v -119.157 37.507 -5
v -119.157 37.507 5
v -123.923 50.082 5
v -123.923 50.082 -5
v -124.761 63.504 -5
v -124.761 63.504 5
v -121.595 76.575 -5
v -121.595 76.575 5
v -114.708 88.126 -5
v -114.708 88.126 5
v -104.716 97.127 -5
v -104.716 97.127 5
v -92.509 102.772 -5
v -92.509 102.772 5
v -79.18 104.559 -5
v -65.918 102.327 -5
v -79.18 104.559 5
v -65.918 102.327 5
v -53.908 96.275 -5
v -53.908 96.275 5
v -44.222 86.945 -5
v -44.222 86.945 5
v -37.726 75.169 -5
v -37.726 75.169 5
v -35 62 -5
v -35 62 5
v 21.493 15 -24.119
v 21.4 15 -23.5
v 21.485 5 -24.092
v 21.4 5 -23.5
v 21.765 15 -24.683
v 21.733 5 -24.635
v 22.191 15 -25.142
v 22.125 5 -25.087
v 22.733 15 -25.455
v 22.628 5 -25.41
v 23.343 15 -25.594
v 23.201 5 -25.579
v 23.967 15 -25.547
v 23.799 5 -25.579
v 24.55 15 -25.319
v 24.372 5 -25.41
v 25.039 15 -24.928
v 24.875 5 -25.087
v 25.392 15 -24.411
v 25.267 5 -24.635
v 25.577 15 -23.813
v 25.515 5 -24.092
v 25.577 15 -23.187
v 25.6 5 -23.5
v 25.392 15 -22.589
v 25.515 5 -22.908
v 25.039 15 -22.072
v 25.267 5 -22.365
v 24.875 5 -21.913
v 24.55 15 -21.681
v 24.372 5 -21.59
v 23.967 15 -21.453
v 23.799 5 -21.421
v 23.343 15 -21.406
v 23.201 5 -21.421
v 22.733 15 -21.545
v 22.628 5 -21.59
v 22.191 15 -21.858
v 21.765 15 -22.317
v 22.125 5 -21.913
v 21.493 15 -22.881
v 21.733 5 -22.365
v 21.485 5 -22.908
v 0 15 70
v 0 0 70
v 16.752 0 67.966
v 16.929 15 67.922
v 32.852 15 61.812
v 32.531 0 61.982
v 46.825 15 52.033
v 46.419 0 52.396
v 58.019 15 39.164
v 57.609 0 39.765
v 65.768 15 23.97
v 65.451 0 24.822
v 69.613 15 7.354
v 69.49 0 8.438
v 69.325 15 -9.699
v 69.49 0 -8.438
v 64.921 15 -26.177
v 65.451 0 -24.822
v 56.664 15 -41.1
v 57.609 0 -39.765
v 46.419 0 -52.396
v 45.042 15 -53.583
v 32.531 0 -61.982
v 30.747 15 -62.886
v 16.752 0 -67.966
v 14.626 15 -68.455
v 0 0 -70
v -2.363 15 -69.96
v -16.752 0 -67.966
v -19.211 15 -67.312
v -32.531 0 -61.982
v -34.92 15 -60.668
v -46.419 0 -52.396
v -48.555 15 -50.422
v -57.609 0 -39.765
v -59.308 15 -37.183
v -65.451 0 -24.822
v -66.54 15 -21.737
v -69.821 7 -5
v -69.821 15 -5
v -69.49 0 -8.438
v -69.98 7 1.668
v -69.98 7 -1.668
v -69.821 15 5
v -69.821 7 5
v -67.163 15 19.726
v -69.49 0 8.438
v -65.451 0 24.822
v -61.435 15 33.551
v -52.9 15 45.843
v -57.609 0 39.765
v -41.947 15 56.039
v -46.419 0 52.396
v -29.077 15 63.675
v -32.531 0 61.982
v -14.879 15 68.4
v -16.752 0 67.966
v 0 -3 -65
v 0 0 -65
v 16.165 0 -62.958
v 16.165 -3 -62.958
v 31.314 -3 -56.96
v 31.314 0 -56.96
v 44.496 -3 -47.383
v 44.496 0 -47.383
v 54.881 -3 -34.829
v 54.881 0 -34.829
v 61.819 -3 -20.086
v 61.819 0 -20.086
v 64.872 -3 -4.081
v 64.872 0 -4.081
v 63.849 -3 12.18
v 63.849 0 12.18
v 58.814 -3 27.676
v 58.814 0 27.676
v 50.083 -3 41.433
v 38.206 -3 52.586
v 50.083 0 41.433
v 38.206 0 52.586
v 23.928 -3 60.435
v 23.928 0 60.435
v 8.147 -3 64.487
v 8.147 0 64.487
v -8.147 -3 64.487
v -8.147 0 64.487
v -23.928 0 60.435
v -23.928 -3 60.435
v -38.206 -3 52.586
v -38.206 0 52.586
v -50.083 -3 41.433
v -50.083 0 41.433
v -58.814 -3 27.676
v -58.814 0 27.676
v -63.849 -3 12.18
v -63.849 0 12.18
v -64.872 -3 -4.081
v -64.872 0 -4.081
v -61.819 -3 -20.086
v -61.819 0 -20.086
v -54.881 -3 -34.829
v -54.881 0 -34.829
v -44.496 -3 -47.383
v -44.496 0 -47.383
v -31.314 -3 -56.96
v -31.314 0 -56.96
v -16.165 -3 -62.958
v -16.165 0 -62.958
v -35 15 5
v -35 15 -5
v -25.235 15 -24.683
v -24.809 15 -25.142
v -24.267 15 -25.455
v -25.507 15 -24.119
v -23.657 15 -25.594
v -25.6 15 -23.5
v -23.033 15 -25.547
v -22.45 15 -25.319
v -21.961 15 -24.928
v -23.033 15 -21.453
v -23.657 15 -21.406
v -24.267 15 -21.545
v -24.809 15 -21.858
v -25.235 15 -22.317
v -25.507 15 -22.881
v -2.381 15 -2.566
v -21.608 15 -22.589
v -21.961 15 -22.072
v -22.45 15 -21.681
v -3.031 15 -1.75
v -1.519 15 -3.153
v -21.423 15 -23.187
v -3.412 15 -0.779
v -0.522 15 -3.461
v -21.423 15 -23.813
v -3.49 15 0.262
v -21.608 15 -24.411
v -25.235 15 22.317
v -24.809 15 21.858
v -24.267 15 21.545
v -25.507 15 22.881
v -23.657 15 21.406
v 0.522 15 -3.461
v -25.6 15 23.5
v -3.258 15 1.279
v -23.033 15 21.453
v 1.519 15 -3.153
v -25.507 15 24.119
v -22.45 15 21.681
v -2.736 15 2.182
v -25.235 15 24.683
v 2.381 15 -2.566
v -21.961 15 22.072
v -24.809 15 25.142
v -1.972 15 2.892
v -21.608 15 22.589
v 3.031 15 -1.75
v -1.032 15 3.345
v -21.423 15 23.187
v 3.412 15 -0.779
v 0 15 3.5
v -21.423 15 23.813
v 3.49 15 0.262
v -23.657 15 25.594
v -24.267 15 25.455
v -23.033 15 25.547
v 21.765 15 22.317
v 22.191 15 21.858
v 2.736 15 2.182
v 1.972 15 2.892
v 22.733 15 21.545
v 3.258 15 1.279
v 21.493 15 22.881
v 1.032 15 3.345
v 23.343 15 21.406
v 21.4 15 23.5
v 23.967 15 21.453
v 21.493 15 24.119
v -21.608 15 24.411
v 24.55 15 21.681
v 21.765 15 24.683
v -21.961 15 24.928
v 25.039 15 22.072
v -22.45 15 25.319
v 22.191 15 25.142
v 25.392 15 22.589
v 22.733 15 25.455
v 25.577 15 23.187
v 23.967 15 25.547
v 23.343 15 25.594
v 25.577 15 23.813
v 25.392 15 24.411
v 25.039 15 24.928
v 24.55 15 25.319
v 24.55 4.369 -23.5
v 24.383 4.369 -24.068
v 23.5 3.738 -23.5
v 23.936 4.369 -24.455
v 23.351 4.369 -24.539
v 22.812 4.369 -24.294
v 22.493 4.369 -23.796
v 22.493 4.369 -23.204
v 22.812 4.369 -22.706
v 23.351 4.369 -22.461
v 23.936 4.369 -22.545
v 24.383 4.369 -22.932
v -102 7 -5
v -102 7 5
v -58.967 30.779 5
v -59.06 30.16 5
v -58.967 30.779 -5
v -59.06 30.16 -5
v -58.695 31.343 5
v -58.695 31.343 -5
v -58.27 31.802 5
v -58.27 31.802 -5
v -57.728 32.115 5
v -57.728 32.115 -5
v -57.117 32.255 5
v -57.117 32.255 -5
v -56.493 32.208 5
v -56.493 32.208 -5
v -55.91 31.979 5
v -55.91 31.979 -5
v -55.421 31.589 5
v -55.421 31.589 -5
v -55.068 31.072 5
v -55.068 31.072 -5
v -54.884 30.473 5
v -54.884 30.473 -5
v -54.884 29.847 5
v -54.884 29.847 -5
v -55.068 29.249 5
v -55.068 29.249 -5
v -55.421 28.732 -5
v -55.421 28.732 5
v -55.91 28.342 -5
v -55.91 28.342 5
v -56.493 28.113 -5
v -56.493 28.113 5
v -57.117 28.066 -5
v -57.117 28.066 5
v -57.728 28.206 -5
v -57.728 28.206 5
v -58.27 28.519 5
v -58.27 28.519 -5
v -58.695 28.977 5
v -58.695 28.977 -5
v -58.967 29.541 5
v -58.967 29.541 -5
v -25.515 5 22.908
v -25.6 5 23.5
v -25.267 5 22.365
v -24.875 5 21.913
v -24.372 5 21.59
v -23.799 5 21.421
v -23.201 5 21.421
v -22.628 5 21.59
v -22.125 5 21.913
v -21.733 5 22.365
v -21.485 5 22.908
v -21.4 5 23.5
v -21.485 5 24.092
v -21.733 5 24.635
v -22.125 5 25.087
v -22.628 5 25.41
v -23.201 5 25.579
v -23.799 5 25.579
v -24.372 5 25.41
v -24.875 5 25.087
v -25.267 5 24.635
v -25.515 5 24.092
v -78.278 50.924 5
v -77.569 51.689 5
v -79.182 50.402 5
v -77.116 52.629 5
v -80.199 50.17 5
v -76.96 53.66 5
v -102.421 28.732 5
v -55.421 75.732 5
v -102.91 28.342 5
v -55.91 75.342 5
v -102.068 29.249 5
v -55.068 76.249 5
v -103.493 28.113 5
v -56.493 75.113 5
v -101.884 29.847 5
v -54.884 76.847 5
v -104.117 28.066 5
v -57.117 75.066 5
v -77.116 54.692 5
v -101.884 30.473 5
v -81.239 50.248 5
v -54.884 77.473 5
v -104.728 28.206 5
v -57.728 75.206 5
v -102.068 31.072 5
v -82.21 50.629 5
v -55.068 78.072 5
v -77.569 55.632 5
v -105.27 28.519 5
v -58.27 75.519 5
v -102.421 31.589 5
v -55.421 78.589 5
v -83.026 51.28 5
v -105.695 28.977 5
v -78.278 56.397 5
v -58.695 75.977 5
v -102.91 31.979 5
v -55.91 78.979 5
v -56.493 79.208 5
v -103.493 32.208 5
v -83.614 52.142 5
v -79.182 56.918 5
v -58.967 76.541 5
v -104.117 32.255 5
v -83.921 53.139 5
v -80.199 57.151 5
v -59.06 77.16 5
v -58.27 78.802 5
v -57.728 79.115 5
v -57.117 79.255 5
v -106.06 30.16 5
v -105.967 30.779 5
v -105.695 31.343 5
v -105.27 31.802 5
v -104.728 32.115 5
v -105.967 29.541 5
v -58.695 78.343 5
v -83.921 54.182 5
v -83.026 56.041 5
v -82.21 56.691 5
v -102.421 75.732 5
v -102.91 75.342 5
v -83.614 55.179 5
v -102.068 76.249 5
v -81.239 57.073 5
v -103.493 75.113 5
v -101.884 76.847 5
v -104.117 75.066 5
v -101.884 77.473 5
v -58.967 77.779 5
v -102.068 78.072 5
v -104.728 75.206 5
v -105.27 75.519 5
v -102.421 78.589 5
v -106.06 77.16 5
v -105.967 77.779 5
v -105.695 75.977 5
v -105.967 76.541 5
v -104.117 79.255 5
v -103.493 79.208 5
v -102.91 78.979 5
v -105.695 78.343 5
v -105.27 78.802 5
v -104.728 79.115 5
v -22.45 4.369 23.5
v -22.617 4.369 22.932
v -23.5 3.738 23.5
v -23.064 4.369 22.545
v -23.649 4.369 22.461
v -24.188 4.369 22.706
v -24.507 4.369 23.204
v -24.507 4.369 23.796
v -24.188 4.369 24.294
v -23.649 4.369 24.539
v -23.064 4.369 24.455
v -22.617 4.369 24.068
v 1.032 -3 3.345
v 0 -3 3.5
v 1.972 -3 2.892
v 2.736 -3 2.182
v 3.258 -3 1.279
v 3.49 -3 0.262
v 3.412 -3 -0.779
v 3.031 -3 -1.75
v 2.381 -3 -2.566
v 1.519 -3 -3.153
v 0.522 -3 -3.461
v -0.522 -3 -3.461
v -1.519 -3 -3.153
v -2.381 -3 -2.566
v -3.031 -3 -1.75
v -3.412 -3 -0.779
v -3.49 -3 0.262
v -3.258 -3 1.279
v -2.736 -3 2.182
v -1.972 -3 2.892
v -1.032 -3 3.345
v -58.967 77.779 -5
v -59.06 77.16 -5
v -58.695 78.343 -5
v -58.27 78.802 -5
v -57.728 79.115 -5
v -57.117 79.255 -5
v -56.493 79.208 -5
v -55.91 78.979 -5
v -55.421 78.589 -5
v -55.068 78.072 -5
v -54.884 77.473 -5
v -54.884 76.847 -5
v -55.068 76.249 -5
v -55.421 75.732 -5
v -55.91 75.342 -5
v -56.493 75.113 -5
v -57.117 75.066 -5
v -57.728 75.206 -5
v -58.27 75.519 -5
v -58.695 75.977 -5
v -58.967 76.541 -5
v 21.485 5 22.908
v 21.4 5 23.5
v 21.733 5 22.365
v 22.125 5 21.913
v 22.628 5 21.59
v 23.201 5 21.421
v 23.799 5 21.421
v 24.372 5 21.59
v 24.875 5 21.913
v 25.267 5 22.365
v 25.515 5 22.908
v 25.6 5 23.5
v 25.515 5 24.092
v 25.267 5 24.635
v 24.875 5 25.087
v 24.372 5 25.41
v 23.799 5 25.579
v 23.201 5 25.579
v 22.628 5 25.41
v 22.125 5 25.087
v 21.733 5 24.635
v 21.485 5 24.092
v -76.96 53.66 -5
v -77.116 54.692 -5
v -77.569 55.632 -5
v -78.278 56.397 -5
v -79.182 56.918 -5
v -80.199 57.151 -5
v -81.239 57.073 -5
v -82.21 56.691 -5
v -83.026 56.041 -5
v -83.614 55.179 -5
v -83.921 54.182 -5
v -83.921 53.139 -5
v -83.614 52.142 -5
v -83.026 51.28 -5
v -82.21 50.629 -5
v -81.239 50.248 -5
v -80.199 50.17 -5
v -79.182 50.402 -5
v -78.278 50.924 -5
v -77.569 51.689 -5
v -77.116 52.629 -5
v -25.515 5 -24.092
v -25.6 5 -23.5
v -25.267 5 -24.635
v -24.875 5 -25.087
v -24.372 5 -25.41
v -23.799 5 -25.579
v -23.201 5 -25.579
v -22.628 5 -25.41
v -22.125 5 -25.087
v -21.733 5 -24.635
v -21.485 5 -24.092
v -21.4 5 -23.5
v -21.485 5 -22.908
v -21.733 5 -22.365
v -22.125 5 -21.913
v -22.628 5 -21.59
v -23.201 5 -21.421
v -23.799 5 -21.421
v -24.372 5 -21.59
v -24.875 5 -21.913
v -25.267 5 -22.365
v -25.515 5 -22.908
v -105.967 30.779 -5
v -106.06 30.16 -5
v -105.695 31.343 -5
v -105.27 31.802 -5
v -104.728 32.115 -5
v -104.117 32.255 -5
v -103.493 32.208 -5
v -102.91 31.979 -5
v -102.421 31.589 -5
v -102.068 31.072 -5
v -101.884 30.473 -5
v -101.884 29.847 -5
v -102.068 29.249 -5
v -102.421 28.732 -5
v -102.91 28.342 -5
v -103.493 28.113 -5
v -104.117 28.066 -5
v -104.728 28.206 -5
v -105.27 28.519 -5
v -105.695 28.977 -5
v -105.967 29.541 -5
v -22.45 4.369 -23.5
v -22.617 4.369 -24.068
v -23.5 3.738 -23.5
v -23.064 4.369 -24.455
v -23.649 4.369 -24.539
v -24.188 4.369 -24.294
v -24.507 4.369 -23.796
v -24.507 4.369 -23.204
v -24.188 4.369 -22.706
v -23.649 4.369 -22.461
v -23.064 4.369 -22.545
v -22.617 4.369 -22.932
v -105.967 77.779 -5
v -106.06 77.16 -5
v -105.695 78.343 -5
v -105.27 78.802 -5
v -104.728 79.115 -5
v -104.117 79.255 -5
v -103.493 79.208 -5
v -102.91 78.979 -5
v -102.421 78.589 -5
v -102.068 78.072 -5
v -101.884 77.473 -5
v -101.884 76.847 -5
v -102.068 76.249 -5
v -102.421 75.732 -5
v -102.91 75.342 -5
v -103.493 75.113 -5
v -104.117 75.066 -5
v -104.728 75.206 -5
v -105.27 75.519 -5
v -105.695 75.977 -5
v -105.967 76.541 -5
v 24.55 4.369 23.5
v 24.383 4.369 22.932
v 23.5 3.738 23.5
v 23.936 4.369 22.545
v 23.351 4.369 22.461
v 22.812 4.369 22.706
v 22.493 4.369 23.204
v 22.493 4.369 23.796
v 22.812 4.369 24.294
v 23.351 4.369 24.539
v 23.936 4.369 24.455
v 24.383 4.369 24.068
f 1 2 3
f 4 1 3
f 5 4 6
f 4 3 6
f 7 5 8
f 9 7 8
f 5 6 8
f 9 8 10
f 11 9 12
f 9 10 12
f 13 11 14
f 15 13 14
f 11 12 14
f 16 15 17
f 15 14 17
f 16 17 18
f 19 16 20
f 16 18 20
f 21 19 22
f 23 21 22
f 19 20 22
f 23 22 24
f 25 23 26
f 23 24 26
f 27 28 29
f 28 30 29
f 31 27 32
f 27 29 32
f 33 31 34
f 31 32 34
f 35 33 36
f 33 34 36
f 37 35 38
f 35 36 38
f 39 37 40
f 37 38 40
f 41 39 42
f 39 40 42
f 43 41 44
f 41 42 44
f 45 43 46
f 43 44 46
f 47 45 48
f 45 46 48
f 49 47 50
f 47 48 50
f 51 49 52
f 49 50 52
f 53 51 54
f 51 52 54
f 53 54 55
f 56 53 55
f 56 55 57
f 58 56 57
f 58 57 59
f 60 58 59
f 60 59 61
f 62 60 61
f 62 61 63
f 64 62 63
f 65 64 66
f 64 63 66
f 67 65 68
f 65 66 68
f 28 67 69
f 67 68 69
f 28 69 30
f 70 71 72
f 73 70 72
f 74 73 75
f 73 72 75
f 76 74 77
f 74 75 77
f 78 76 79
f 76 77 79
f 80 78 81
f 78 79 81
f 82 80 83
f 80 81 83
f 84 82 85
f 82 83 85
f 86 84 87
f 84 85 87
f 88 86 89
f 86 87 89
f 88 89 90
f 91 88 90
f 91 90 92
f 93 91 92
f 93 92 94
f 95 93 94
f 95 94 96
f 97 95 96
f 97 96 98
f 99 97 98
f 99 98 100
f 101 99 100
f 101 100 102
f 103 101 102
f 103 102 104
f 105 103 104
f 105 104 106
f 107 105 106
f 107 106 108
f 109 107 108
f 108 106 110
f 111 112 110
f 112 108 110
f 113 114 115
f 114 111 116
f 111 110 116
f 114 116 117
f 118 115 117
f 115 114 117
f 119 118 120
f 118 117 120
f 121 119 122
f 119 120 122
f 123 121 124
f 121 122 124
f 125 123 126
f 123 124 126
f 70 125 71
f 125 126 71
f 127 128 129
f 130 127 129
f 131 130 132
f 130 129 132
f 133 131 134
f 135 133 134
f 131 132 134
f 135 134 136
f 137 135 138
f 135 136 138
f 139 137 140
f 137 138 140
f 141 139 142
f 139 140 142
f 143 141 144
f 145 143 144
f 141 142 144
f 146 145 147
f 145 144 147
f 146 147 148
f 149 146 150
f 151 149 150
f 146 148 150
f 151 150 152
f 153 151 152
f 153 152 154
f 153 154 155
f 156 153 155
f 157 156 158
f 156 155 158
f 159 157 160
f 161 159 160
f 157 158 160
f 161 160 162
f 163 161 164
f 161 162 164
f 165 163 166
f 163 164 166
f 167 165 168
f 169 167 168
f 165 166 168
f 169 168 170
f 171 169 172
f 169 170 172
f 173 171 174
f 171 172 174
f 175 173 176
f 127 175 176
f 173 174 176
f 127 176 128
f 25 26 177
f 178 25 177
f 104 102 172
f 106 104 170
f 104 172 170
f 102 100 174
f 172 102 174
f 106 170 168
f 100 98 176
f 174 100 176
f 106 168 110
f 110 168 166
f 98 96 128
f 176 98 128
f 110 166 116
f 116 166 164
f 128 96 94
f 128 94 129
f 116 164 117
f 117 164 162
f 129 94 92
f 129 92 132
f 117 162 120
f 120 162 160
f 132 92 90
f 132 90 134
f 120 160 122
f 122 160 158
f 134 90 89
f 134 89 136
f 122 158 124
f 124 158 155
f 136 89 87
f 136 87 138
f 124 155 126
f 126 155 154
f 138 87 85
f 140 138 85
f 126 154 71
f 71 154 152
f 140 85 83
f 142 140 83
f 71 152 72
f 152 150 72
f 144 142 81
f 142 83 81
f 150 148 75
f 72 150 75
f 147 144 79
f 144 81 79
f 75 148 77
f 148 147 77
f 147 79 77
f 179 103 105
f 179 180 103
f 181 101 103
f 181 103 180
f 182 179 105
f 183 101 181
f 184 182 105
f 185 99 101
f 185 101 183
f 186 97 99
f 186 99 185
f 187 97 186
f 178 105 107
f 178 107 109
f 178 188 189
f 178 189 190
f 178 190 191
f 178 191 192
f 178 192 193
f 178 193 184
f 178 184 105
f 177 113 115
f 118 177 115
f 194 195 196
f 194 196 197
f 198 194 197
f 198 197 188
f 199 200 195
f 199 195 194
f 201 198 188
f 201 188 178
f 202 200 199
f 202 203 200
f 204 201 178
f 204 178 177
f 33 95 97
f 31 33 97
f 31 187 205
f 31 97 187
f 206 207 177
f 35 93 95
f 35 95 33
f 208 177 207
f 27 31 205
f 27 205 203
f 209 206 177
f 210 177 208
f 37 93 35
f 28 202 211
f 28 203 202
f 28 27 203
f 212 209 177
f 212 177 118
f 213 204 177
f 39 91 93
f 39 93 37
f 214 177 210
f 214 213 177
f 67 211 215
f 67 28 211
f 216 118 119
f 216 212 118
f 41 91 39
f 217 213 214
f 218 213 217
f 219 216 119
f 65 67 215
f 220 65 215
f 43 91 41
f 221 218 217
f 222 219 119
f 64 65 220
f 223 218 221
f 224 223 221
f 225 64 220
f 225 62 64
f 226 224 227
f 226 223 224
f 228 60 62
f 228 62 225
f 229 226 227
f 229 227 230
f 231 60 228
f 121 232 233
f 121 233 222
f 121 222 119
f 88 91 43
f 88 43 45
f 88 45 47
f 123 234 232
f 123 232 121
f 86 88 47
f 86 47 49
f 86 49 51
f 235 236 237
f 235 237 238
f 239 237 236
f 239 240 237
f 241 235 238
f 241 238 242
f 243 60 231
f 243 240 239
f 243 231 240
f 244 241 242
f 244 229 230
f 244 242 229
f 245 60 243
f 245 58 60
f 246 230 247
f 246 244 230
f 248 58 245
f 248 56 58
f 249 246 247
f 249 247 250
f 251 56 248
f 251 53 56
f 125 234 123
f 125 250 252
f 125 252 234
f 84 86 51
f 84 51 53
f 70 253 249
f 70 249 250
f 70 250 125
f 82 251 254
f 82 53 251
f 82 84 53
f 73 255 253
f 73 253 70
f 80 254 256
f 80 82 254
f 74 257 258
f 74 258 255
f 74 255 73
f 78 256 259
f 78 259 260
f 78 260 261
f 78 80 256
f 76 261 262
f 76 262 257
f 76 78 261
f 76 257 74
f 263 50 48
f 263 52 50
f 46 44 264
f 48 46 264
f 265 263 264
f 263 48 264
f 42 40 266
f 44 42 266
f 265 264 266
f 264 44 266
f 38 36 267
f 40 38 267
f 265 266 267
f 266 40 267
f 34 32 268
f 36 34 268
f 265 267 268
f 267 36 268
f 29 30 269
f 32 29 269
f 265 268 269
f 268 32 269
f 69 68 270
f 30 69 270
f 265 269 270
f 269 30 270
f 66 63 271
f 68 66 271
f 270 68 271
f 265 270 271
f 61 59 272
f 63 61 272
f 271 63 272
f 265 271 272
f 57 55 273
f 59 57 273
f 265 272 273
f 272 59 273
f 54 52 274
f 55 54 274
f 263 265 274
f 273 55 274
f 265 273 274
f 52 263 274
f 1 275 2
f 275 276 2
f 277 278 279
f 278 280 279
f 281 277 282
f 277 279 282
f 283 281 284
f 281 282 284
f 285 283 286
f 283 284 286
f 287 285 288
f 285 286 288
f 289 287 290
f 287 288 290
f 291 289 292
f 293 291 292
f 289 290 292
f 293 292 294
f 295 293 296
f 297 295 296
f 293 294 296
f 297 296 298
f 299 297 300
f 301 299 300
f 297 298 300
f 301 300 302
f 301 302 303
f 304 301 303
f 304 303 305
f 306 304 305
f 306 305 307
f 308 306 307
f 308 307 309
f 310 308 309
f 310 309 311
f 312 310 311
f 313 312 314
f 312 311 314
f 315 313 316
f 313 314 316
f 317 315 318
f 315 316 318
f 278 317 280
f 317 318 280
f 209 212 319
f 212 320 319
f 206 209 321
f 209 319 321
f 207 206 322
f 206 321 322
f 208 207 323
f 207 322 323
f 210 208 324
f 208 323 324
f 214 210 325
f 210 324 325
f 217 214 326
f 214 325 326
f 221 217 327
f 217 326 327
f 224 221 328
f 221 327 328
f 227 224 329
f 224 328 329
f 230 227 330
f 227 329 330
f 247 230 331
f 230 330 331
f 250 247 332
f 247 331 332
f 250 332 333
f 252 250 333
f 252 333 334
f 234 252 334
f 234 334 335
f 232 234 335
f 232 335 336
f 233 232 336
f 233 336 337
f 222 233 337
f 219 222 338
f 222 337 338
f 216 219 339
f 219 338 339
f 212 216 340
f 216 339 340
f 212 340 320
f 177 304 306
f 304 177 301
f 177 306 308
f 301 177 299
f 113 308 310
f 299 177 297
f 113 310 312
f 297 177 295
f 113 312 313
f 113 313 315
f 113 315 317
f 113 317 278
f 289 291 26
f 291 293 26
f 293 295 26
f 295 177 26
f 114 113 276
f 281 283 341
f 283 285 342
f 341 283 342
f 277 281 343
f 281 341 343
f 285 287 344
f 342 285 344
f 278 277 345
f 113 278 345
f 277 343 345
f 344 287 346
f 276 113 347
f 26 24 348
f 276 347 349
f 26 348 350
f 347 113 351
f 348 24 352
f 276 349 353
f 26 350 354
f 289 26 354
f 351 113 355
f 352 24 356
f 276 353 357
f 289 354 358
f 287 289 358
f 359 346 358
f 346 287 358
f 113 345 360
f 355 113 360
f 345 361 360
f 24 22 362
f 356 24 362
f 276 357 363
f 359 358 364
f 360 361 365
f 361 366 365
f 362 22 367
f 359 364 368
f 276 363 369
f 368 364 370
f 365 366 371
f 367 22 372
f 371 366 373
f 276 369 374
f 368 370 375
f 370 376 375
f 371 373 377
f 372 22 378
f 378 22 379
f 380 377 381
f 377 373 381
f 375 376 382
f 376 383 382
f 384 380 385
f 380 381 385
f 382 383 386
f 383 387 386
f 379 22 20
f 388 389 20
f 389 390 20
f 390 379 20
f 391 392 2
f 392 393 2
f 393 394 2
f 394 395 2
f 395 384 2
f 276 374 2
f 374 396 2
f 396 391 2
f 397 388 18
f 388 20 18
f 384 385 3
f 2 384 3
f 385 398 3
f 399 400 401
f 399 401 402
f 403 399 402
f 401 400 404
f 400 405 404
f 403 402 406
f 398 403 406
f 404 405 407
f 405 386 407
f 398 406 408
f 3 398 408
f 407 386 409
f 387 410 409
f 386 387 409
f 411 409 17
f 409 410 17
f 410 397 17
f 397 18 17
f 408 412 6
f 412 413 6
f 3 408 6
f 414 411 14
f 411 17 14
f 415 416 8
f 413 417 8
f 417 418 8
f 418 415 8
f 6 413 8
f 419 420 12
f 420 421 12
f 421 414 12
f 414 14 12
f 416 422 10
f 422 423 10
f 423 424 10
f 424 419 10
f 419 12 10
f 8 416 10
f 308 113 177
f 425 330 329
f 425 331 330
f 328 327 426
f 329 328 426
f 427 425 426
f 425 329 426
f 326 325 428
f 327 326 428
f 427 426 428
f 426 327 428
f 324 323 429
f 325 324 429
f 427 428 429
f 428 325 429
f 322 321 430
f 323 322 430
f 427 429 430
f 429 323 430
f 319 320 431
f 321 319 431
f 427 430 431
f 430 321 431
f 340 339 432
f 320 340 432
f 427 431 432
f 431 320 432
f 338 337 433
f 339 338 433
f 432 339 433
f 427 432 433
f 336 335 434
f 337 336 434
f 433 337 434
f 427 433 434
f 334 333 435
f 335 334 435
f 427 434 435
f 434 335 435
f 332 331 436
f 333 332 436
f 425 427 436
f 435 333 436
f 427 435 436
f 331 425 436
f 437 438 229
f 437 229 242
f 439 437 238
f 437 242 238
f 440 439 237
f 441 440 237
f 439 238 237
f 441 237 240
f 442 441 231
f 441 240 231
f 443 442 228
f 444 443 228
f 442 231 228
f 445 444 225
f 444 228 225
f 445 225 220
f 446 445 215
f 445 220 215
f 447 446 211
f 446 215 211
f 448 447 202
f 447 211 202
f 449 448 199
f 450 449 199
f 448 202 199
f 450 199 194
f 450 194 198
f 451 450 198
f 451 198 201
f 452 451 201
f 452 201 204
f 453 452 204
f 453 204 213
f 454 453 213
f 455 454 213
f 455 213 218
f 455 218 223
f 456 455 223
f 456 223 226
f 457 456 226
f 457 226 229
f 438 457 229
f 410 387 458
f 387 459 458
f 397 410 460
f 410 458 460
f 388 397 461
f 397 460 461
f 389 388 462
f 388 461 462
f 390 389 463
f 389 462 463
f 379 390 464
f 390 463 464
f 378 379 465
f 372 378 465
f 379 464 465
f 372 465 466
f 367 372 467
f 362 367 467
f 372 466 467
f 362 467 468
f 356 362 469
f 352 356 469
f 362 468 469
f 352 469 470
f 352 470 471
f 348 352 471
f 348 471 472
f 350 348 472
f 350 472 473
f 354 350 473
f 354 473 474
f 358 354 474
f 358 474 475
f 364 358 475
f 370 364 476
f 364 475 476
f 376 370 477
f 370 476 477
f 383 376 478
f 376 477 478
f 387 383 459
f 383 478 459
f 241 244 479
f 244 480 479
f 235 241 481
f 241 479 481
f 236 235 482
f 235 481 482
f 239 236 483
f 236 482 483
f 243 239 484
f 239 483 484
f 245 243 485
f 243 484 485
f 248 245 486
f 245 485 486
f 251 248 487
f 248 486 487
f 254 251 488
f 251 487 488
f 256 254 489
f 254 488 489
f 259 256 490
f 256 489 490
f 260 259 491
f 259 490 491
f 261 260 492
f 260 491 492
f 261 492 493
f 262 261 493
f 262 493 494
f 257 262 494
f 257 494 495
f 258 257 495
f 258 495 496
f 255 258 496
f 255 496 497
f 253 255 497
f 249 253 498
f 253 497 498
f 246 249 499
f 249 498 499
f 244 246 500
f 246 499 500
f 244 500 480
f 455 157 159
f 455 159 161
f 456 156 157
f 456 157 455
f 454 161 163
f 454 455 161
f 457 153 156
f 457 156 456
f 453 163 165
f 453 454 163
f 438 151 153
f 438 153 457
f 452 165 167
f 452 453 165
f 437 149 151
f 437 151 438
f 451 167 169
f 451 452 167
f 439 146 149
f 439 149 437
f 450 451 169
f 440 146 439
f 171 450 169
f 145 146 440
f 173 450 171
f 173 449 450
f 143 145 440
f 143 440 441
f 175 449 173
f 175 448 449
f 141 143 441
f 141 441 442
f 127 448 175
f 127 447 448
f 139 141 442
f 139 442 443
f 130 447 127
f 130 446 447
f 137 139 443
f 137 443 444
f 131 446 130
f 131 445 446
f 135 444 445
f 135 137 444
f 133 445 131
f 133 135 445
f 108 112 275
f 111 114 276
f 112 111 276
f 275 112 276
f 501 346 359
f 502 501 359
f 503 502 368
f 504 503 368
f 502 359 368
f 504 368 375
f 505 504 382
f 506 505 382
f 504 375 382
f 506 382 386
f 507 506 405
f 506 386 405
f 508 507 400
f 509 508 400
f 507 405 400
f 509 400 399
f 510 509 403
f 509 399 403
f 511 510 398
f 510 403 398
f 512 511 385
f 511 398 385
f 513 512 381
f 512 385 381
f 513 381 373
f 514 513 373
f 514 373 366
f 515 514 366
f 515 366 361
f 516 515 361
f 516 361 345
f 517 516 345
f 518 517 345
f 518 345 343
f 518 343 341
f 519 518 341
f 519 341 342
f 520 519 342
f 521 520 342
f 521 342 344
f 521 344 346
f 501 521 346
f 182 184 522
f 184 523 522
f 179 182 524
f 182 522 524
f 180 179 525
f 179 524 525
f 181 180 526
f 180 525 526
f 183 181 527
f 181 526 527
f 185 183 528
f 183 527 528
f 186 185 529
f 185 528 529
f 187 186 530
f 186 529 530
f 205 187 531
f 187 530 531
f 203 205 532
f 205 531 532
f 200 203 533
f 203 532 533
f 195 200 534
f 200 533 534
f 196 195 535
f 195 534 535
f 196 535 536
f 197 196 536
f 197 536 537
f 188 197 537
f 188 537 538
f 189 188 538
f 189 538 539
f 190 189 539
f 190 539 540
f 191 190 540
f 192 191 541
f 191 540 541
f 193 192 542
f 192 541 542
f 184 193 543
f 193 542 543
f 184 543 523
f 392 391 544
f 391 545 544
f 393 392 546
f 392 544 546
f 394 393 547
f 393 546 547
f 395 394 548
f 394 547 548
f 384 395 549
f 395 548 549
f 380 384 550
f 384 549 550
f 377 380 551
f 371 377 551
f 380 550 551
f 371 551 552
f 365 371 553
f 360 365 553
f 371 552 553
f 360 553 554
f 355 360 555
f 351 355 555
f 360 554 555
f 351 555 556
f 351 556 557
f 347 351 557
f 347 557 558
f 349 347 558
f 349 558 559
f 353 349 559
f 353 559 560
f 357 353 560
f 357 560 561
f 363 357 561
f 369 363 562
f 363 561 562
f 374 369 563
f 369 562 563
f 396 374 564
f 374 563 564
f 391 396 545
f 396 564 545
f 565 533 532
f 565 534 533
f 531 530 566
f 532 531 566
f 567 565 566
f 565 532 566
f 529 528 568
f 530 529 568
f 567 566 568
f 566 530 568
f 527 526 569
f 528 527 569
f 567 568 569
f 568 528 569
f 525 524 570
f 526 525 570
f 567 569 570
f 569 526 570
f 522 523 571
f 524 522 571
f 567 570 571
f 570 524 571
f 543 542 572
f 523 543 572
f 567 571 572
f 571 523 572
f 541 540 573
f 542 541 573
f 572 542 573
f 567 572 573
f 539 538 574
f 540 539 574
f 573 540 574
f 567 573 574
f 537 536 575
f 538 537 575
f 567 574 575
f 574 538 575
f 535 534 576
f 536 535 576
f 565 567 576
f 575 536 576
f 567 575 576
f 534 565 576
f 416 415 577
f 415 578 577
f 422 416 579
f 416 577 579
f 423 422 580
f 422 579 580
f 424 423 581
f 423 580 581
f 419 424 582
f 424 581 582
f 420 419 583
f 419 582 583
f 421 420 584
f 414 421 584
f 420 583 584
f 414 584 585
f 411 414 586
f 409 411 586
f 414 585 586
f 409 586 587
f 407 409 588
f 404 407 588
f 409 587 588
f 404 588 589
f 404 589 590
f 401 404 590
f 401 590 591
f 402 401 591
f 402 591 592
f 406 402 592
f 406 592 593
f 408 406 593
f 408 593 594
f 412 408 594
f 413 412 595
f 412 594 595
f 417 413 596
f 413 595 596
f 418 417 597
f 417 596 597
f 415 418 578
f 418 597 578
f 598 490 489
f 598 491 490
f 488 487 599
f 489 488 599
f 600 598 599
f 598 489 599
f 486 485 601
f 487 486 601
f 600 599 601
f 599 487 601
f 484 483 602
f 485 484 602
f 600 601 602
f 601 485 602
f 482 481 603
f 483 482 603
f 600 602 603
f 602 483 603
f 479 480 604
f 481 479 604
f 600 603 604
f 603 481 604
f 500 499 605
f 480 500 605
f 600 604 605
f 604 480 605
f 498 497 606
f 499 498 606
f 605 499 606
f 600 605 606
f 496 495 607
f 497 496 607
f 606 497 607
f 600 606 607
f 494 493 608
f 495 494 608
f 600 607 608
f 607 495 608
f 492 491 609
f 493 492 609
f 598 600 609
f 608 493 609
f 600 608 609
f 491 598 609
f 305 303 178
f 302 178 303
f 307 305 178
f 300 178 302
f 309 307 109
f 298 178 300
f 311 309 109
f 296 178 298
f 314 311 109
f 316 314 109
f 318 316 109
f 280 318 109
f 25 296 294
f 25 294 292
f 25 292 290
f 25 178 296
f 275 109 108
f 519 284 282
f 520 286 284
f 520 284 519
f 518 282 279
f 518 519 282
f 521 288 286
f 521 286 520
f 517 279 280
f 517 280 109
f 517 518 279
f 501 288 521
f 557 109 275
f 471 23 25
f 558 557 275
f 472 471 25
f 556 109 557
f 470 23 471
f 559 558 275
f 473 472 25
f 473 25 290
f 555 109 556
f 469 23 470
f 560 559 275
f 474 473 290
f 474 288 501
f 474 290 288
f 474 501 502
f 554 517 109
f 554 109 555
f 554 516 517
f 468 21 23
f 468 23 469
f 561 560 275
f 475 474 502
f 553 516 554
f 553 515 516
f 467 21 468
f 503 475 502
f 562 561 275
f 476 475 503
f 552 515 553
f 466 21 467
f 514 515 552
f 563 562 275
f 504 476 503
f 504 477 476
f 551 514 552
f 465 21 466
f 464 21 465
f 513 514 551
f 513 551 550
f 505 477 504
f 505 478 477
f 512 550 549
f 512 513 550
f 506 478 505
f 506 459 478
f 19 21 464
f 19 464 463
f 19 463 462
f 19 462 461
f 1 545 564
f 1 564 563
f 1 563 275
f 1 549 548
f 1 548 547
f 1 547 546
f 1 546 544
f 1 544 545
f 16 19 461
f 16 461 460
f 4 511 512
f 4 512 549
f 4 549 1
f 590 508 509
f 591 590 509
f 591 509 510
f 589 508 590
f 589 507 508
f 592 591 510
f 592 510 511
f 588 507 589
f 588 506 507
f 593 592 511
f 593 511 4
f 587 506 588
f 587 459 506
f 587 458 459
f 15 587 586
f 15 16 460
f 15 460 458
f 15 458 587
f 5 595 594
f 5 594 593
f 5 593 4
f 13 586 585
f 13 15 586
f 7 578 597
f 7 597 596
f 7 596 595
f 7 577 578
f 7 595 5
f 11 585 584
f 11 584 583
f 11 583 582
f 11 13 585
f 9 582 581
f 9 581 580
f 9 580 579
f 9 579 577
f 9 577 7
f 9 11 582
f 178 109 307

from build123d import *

# Parameters (mm, degrees)
SKETCH1_R                 = 70
BOSS_EXTRUDE2_DEPTH       = 15
SKETCH2_R                 = 65
BOSS_EXTRUDE3_DEPTH       = 3
BOSS_EXTRUDE4_DEPTH       = 5
M5X0_8_TAPPED_HOLE2_D     = 4.2
M5X0_8_TAPPED_HOLE2_DEPTH = 10
M5X0_8_TAPPED_HOLE2_TIP   = 1.2618073
SKETCH8_R                 = 3.5
CUT_EXTRUDE1_DEPTH        = 169.909563464
M5X0_8_TAPPED_HOLE3_D     = 4.2
M5X0_8_TAPPED_HOLE3_DEPTH = 10
M5X0_8_TAPPED_HOLE3_TIP   = 1.2618073
SKETCH14_R                = 3.5
CUT_EXTRUDE2_DEPTH        = 178.408330527


with BuildPart() as part:
    # Sketch1 → Boss-Extrude2 (new body)
    with BuildSketch(Plane(origin=(0, 0, 0), x_dir=(1, 0, 0), z_dir=(0, 1, 0))):
        with Locations(Location((0, 0, 0), (0, 0, 270))):
            Circle(SKETCH1_R)
    extrude(amount=BOSS_EXTRUDE2_DEPTH)

    # Sketch2 → Boss-Extrude3 (add)
    with BuildSketch(Plane.XZ):
        with Locations(Location((0, 0, 0), (0, 0, 270))):
            Circle(SKETCH2_R)
    extrude(amount=BOSS_EXTRUDE3_DEPTH)

    # Sketch3 → Boss-Extrude4 (add, symmetric)
    with BuildSketch(Plane.XY):
        with BuildLine():
            Line((-35, 62), (-35, 7))
            Line((-35, 7), (-102, 7))
            Line((-102, 7), (-119.156726544, 37.506503148))
            ThreePointArc((-119.156726544, 37.506503148), (-92.509371405, 102.772350464), (-35, 62))
        make_face()
    extrude(amount=BOSS_EXTRUDE4_DEPTH, both=True)

    # M5x0.8 Tapped Hole2
    with Locations(Plane(origin=(0, 15, 0), x_dir=(1, 0, 0), z_dir=(0, 1, 0))):
        with Locations((-23.5, 23.5), (23.5, 23.5), (23.5, -23.5), (-23.5, -23.5)):
            Hole(M5X0_8_TAPPED_HOLE2_D / 2, depth=M5X0_8_TAPPED_HOLE2_DEPTH)
            with Locations((0, 0, -(M5X0_8_TAPPED_HOLE2_DEPTH + M5X0_8_TAPPED_HOLE2_TIP / 2))):  # 118° drill point
                Cone(0, M5X0_8_TAPPED_HOLE2_D / 2, M5X0_8_TAPPED_HOLE2_TIP, mode=Mode.SUBTRACT)

    # Sketch8 → Cut-Extrude1 (cut, through all)
    with BuildSketch(Plane(origin=(0, 15, 0), x_dir=(1, 0, 0), z_dir=(0, 1, 0))):
        with Locations(Location((0, 0, 0), (0, 0, 270))):
            Circle(SKETCH8_R)
    extrude(amount=-CUT_EXTRUDE1_DEPTH, mode=Mode.SUBTRACT)

    # M5x0.8 Tapped Hole3
    with Locations(Plane(origin=(-80.46035162, 53.660377077, 5), x_dir=(1, 0, 0), z_dir=(0, 0, 1))):
        with Locations((-23.5, 23.5), (23.5, 23.5), (23.5, -23.5), (-23.5, -23.5)):
            Hole(M5X0_8_TAPPED_HOLE3_D / 2, depth=M5X0_8_TAPPED_HOLE3_DEPTH)
            with Locations((0, 0, -(M5X0_8_TAPPED_HOLE3_DEPTH + M5X0_8_TAPPED_HOLE3_TIP / 2))):  # 118° drill point
                Cone(0, M5X0_8_TAPPED_HOLE3_D / 2, M5X0_8_TAPPED_HOLE3_TIP, mode=Mode.SUBTRACT)

    # Sketch14 → Cut-Extrude2 (cut, through all)
    with BuildSketch(Plane(origin=(-80.46035162, 53.660377077, 5), x_dir=(1, 0, 0), z_dir=(0, 0, 1))):
        Circle(SKETCH14_R)
    extrude(amount=-CUT_EXTRUDE2_DEPTH, mode=Mode.SUBTRACT)


solid = part.part
